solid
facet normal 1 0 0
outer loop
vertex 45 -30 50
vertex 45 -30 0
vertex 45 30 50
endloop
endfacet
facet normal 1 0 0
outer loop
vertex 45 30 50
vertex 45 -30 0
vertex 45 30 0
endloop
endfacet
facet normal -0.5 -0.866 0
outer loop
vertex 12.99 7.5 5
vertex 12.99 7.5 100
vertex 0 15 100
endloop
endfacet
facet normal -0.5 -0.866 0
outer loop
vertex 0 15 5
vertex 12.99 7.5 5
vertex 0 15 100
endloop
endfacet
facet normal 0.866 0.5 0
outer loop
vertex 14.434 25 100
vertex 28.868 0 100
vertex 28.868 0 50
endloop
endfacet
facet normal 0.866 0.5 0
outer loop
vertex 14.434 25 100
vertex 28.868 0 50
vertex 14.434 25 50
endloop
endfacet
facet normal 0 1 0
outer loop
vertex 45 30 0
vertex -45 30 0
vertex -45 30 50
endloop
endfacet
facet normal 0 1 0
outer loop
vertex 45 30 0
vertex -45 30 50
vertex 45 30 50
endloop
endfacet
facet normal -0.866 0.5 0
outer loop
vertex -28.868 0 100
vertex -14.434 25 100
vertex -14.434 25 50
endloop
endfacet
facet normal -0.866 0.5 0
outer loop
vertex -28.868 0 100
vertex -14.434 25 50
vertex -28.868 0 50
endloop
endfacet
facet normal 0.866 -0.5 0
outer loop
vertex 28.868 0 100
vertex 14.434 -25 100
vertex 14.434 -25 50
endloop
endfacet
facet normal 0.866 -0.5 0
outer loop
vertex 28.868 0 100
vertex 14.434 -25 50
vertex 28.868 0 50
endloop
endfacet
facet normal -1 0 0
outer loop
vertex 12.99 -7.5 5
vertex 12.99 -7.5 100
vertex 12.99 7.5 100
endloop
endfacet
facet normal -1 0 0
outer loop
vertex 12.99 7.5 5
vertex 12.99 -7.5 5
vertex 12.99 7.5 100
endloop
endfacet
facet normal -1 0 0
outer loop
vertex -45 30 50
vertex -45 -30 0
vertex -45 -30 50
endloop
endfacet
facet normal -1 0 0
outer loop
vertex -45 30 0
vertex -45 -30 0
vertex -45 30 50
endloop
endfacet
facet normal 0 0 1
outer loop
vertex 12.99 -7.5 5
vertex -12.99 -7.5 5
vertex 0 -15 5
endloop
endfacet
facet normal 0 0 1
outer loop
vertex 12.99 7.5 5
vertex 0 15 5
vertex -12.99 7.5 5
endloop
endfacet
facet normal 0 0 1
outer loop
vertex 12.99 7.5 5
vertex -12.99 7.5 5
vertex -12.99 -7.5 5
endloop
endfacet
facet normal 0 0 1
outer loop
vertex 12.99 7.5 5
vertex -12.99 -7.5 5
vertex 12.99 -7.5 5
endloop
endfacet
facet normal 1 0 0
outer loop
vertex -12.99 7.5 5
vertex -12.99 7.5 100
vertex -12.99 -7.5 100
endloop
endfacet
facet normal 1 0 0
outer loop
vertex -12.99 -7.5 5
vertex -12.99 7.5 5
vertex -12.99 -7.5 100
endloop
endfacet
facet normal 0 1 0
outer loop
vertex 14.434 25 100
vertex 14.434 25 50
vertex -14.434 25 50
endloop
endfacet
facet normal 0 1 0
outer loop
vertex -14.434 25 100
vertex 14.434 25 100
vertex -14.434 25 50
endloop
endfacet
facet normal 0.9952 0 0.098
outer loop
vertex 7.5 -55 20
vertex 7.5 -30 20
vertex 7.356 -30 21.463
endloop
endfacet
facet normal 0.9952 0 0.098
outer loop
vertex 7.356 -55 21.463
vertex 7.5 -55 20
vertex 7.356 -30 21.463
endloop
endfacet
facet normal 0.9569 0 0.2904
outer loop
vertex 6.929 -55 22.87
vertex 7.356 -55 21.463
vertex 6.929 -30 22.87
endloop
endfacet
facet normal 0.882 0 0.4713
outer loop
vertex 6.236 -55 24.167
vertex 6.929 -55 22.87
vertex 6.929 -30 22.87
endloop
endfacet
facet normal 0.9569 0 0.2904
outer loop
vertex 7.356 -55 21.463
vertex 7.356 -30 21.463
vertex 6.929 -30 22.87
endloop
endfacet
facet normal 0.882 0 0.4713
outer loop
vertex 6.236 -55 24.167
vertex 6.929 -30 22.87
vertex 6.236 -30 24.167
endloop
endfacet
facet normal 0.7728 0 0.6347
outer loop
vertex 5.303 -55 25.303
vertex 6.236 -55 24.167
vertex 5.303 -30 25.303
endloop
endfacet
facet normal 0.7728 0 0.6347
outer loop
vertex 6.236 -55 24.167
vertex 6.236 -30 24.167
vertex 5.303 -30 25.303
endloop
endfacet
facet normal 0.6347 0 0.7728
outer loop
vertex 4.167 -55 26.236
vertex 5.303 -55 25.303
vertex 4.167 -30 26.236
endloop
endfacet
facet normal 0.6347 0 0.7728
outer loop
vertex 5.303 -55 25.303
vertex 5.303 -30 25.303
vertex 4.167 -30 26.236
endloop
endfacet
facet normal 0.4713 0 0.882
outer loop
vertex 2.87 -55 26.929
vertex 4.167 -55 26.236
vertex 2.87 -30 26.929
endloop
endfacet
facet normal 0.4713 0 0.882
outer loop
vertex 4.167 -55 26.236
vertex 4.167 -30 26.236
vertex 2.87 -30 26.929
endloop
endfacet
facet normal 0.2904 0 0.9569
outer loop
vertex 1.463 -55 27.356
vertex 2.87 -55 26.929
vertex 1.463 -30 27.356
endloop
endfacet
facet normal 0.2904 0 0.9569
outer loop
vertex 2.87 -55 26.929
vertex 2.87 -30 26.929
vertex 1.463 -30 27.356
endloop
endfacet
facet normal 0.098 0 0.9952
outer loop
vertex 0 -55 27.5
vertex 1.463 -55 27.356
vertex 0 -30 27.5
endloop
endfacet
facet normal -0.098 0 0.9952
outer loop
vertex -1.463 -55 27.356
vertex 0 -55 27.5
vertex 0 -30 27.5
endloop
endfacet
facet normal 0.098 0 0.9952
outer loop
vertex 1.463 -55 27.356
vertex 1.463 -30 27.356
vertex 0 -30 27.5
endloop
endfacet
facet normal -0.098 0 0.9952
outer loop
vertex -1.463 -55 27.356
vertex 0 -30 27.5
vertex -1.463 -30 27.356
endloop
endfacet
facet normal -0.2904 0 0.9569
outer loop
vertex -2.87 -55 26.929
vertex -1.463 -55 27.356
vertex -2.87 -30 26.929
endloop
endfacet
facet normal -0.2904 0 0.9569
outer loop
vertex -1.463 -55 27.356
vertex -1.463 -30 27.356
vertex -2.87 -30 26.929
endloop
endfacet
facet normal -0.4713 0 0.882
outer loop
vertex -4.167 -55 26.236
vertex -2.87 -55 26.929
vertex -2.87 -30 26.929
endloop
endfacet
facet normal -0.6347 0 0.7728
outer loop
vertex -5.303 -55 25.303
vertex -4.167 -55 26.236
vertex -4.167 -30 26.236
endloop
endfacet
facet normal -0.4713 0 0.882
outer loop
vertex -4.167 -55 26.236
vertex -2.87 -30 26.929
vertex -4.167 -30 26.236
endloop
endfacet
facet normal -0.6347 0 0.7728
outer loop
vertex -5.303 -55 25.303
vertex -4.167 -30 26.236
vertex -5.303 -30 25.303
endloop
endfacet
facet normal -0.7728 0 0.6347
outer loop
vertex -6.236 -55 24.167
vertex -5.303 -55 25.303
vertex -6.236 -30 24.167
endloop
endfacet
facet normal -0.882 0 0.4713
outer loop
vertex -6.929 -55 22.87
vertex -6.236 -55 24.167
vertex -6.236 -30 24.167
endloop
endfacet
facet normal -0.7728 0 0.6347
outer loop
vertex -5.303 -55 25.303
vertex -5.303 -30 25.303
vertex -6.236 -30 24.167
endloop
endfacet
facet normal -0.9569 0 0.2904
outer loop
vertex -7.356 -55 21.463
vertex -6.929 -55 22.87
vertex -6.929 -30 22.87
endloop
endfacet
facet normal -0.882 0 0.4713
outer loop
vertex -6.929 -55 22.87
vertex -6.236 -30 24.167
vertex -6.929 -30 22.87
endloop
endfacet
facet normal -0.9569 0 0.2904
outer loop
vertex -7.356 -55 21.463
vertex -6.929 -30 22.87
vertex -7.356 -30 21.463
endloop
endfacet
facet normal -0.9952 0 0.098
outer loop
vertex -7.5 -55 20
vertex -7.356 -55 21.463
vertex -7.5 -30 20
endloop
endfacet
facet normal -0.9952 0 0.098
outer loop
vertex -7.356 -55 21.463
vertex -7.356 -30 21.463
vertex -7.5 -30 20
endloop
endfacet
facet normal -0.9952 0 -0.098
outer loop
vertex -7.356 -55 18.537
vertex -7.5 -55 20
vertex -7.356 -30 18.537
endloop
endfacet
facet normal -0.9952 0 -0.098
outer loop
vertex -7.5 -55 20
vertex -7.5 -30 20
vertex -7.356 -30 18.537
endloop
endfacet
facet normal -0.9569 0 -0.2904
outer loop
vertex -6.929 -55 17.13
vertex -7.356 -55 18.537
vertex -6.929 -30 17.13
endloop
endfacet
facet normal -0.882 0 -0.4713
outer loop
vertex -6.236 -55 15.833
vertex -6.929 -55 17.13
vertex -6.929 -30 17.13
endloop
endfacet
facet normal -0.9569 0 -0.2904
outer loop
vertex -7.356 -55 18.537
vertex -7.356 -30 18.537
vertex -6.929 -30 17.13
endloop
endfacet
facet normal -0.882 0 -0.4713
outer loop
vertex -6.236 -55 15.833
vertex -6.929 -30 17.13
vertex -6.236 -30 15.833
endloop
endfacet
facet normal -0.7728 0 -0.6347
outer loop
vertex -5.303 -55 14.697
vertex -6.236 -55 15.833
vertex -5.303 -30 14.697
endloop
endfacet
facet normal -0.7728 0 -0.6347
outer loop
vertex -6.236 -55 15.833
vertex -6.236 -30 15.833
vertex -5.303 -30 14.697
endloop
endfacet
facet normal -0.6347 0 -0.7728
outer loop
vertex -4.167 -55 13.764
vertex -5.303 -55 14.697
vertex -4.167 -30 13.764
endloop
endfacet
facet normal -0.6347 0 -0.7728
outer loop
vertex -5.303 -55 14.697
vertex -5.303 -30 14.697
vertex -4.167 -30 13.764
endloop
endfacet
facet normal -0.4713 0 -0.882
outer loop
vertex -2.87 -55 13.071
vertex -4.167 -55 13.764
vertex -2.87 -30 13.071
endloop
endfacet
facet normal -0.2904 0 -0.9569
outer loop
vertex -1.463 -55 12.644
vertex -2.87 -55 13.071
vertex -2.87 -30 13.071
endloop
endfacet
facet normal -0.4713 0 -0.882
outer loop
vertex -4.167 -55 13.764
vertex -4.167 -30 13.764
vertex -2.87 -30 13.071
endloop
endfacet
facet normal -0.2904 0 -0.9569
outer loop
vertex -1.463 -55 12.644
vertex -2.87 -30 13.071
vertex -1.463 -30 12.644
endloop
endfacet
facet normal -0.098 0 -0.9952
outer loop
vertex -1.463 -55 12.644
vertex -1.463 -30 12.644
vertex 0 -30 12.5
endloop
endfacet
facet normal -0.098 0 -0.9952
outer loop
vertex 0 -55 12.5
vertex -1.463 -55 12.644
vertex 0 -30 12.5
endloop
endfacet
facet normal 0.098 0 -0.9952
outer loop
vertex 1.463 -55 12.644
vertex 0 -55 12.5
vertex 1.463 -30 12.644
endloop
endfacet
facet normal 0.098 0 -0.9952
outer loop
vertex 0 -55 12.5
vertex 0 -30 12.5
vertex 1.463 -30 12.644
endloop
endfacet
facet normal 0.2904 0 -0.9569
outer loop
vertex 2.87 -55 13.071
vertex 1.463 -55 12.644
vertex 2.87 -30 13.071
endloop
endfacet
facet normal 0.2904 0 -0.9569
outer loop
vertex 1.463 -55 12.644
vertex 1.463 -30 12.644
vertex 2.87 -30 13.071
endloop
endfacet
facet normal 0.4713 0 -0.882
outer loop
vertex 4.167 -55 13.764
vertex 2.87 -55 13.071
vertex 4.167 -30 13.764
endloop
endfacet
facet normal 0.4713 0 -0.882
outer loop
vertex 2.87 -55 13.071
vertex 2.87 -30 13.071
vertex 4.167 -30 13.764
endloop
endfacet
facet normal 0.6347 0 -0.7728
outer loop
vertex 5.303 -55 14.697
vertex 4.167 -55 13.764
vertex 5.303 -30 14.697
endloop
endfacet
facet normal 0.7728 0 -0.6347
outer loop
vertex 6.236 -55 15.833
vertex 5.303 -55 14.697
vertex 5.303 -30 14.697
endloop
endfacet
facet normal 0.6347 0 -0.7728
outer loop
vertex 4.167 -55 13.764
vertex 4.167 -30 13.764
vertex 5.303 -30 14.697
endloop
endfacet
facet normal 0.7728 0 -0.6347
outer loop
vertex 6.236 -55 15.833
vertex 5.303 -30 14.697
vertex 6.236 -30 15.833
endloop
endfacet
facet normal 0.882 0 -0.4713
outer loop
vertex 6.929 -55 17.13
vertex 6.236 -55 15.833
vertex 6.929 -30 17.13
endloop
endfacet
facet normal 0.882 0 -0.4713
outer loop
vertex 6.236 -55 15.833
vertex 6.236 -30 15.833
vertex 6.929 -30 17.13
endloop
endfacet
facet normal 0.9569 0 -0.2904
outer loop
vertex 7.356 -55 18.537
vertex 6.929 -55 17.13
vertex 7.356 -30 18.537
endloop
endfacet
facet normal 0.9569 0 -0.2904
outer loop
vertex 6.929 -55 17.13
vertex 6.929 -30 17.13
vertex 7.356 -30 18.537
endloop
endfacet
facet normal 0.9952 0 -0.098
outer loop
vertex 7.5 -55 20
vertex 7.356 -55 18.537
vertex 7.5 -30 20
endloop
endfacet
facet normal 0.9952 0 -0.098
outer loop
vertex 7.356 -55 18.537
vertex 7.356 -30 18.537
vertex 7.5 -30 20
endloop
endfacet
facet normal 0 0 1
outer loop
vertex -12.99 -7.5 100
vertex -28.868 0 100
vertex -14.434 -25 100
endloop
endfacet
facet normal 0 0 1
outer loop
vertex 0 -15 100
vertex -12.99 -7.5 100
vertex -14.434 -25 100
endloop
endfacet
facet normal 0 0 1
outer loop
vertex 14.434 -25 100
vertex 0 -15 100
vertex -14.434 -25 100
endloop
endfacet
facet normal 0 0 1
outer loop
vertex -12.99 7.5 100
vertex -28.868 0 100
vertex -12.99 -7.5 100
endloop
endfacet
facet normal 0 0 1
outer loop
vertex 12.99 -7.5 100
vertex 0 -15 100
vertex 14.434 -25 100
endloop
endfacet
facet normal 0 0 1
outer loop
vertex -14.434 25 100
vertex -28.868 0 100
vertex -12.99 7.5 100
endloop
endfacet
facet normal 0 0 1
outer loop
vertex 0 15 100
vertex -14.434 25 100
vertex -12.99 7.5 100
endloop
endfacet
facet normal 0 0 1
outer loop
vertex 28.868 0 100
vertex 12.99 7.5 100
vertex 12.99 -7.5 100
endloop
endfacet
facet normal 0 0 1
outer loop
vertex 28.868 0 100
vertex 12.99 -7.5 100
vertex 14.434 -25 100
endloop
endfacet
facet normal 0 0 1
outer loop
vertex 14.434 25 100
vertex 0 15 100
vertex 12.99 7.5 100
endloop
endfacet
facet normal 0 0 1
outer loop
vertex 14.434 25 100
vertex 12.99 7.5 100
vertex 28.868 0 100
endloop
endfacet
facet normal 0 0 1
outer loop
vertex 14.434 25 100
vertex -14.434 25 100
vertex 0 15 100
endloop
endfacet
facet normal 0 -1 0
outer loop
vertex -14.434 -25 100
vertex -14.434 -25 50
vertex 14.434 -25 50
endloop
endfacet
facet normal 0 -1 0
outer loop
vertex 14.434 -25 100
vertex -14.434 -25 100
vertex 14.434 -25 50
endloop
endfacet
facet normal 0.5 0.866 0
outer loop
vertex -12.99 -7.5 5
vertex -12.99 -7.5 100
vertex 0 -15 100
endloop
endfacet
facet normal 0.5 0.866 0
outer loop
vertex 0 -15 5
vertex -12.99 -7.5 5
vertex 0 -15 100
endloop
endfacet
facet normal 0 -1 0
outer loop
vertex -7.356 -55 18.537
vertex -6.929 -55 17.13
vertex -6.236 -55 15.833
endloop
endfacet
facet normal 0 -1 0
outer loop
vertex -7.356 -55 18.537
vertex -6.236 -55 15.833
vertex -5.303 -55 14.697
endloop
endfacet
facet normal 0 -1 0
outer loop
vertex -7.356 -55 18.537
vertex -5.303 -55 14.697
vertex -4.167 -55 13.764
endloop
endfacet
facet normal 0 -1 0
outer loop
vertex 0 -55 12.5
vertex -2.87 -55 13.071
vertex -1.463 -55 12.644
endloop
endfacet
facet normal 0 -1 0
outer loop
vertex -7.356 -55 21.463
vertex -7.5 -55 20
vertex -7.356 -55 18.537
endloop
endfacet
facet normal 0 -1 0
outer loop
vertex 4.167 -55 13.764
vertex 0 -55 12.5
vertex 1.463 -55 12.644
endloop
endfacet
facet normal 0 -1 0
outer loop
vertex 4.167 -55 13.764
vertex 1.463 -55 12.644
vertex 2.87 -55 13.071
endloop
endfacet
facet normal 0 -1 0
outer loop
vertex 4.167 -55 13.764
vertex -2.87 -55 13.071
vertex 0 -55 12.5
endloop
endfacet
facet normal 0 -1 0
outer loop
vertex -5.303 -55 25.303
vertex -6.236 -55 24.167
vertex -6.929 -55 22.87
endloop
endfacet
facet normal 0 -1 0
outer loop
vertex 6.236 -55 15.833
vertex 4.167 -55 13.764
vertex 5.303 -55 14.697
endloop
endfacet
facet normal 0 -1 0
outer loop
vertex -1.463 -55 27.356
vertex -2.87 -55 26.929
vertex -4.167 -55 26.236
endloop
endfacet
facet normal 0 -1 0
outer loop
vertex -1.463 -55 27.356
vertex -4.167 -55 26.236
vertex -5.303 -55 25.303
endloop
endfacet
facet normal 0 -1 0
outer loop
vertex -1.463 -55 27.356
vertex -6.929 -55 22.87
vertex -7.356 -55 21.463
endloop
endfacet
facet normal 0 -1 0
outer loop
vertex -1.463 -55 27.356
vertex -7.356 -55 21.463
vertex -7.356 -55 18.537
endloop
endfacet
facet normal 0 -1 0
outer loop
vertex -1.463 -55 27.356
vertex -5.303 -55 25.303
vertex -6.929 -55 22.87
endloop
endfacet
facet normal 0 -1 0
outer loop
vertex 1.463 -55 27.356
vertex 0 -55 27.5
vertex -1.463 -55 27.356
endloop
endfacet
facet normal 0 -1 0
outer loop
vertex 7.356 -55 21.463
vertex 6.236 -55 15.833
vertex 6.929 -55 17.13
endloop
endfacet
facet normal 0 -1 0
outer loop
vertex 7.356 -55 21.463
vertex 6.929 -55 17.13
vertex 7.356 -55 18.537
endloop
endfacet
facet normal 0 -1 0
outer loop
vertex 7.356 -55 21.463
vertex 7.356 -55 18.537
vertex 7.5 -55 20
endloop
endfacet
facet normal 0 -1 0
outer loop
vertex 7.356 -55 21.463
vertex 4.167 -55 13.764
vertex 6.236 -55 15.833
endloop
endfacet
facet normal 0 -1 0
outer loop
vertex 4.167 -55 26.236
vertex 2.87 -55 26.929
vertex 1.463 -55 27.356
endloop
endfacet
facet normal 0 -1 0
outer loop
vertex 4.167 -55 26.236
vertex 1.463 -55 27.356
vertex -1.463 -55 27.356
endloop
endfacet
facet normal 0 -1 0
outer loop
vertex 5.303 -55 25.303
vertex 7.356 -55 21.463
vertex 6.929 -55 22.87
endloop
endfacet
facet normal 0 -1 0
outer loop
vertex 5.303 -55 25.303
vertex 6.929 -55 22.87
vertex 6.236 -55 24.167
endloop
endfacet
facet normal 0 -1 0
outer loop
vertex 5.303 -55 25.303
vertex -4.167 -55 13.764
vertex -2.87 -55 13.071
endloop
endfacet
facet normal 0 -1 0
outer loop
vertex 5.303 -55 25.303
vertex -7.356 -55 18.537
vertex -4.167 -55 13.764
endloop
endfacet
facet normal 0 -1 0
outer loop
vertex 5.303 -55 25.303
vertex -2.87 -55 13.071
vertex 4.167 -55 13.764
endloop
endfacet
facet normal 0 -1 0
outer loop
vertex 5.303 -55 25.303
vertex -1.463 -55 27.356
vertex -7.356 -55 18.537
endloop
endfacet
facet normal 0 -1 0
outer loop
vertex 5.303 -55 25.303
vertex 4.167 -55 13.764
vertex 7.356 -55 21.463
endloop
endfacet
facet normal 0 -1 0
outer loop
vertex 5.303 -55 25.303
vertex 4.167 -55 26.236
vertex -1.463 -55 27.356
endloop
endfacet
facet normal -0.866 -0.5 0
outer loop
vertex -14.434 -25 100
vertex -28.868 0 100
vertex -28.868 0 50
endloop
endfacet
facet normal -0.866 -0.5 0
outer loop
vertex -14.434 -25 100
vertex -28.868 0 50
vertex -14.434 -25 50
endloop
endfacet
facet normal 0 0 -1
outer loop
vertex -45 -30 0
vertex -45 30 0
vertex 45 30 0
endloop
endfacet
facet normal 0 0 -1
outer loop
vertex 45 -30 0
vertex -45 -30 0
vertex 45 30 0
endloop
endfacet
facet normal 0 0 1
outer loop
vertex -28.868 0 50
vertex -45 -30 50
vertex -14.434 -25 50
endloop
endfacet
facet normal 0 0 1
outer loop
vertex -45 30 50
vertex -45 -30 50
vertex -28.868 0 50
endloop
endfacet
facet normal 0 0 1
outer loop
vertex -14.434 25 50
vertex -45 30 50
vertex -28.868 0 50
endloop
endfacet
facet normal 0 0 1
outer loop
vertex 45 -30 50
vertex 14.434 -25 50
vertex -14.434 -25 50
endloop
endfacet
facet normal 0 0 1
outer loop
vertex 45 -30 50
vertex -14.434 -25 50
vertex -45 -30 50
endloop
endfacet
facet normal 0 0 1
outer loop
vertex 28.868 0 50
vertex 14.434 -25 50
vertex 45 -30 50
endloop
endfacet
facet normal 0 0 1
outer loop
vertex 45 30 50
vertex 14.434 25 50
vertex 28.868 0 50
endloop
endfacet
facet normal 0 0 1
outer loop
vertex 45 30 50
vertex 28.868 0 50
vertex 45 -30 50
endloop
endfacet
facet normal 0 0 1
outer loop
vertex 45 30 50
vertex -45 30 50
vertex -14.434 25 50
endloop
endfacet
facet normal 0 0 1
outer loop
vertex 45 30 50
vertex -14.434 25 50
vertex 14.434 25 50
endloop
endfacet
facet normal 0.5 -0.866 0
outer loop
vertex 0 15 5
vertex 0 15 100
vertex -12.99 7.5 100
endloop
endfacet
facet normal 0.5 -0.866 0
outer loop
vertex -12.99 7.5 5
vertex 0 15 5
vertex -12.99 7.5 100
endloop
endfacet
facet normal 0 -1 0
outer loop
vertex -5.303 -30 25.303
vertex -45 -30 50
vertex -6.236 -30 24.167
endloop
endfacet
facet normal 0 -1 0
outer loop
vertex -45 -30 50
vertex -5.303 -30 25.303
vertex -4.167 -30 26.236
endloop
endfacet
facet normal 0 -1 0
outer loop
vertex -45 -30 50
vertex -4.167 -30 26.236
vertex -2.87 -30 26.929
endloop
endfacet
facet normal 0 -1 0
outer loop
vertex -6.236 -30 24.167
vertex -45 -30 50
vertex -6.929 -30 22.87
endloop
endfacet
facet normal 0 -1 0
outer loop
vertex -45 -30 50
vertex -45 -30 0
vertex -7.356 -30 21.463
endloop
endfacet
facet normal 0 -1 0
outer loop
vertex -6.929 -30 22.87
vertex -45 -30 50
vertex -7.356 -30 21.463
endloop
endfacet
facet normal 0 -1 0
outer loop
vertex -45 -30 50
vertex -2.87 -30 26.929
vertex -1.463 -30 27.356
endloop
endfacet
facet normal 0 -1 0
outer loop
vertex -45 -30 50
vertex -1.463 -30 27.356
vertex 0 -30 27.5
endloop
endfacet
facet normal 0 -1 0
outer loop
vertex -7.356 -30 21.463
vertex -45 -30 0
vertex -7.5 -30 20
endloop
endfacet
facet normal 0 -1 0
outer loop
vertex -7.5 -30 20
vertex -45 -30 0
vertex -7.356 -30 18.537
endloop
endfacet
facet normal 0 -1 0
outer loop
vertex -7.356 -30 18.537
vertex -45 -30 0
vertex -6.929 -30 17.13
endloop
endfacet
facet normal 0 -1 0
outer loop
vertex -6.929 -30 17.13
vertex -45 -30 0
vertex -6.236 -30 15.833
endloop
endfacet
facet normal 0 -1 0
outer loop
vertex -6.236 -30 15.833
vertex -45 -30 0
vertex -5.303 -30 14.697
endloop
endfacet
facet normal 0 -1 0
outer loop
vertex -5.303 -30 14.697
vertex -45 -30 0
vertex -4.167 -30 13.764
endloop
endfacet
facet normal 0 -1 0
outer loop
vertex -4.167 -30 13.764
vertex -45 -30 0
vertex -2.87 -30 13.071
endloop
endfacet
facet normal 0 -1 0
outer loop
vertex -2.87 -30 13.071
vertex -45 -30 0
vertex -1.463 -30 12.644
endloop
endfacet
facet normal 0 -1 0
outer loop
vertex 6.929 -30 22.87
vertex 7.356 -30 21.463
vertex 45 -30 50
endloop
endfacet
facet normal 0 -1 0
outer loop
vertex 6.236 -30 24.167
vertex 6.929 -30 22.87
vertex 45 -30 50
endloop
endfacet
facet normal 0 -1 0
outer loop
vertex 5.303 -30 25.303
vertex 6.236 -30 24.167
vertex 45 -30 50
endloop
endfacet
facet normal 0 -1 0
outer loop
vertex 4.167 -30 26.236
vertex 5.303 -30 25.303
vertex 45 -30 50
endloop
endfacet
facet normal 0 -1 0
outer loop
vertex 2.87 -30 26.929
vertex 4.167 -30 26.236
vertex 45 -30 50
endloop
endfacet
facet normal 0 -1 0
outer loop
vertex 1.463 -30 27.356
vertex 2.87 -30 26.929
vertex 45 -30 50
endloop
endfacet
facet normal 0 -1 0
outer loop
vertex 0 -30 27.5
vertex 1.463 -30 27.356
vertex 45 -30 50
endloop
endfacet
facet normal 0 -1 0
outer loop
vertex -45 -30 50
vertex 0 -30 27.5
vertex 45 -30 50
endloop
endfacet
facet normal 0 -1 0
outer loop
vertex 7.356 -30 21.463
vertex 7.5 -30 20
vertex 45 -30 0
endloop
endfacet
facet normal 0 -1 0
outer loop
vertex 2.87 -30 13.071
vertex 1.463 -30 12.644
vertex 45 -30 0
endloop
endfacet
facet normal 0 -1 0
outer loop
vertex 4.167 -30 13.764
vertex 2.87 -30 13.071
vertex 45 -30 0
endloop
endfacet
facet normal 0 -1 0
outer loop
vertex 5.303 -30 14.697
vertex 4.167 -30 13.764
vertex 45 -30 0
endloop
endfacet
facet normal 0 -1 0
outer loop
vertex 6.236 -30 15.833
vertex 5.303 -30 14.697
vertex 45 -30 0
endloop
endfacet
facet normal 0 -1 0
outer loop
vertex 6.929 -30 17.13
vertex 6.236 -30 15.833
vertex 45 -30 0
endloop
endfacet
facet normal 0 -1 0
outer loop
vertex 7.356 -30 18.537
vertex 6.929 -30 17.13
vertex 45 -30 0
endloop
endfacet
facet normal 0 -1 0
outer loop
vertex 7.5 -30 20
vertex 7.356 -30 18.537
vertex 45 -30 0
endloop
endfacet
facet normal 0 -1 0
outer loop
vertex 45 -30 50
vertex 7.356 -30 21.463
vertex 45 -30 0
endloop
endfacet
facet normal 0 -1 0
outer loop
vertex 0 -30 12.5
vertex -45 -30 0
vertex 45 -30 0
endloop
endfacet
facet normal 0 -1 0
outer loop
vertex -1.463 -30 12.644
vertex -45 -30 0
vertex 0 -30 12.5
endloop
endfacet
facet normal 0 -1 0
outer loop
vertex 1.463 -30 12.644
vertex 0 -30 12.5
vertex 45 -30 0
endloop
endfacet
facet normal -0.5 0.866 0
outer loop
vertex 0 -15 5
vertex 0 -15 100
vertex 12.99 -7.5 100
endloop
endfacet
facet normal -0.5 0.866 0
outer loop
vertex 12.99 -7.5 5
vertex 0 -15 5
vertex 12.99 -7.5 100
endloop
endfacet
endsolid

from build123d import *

# Parameters (mm, degrees)
F0_W     = 90
F0_H     = 60
F1_DEPTH = 50
F2_R     = 7.5
F3_DEPTH = 25
F5_DEPTH = 50
F7_DEPTH = 95


with BuildPart() as f1:
    # F0 (on Top) → F1 (new body)
    with BuildSketch(Plane.XY):
        Rectangle(F0_W, F0_H)
    extrude(amount=F1_DEPTH)

    # F2 (on face) → F3 (join)
    with BuildSketch(Plane.XZ.offset(30)):
        with Locations((0, 20)):
            Circle(F2_R)
    extrude(amount=F3_DEPTH)

    # F4 (on face) → F5 (join)
    with BuildSketch(Plane.XY.offset(50)):
        Polygon((-14.433757, -25), (14.433757, -25), (28.867513, 0), (14.433757, 25), (-14.433757, 25), (-28.867513, 0), align=None)
    extrude(amount=F5_DEPTH)

    # F6 (on face) → F7 (cut)
    with BuildSketch(Plane.XY.offset(100)):
        Polygon((12.990381, 7.5), (0, 15), (-12.990381, 7.5), (-12.990381, -7.5), (0, -15), (12.990381, -7.5), align=None)
    extrude(amount=-F7_DEPTH, mode=Mode.SUBTRACT)


solid = f1.part
